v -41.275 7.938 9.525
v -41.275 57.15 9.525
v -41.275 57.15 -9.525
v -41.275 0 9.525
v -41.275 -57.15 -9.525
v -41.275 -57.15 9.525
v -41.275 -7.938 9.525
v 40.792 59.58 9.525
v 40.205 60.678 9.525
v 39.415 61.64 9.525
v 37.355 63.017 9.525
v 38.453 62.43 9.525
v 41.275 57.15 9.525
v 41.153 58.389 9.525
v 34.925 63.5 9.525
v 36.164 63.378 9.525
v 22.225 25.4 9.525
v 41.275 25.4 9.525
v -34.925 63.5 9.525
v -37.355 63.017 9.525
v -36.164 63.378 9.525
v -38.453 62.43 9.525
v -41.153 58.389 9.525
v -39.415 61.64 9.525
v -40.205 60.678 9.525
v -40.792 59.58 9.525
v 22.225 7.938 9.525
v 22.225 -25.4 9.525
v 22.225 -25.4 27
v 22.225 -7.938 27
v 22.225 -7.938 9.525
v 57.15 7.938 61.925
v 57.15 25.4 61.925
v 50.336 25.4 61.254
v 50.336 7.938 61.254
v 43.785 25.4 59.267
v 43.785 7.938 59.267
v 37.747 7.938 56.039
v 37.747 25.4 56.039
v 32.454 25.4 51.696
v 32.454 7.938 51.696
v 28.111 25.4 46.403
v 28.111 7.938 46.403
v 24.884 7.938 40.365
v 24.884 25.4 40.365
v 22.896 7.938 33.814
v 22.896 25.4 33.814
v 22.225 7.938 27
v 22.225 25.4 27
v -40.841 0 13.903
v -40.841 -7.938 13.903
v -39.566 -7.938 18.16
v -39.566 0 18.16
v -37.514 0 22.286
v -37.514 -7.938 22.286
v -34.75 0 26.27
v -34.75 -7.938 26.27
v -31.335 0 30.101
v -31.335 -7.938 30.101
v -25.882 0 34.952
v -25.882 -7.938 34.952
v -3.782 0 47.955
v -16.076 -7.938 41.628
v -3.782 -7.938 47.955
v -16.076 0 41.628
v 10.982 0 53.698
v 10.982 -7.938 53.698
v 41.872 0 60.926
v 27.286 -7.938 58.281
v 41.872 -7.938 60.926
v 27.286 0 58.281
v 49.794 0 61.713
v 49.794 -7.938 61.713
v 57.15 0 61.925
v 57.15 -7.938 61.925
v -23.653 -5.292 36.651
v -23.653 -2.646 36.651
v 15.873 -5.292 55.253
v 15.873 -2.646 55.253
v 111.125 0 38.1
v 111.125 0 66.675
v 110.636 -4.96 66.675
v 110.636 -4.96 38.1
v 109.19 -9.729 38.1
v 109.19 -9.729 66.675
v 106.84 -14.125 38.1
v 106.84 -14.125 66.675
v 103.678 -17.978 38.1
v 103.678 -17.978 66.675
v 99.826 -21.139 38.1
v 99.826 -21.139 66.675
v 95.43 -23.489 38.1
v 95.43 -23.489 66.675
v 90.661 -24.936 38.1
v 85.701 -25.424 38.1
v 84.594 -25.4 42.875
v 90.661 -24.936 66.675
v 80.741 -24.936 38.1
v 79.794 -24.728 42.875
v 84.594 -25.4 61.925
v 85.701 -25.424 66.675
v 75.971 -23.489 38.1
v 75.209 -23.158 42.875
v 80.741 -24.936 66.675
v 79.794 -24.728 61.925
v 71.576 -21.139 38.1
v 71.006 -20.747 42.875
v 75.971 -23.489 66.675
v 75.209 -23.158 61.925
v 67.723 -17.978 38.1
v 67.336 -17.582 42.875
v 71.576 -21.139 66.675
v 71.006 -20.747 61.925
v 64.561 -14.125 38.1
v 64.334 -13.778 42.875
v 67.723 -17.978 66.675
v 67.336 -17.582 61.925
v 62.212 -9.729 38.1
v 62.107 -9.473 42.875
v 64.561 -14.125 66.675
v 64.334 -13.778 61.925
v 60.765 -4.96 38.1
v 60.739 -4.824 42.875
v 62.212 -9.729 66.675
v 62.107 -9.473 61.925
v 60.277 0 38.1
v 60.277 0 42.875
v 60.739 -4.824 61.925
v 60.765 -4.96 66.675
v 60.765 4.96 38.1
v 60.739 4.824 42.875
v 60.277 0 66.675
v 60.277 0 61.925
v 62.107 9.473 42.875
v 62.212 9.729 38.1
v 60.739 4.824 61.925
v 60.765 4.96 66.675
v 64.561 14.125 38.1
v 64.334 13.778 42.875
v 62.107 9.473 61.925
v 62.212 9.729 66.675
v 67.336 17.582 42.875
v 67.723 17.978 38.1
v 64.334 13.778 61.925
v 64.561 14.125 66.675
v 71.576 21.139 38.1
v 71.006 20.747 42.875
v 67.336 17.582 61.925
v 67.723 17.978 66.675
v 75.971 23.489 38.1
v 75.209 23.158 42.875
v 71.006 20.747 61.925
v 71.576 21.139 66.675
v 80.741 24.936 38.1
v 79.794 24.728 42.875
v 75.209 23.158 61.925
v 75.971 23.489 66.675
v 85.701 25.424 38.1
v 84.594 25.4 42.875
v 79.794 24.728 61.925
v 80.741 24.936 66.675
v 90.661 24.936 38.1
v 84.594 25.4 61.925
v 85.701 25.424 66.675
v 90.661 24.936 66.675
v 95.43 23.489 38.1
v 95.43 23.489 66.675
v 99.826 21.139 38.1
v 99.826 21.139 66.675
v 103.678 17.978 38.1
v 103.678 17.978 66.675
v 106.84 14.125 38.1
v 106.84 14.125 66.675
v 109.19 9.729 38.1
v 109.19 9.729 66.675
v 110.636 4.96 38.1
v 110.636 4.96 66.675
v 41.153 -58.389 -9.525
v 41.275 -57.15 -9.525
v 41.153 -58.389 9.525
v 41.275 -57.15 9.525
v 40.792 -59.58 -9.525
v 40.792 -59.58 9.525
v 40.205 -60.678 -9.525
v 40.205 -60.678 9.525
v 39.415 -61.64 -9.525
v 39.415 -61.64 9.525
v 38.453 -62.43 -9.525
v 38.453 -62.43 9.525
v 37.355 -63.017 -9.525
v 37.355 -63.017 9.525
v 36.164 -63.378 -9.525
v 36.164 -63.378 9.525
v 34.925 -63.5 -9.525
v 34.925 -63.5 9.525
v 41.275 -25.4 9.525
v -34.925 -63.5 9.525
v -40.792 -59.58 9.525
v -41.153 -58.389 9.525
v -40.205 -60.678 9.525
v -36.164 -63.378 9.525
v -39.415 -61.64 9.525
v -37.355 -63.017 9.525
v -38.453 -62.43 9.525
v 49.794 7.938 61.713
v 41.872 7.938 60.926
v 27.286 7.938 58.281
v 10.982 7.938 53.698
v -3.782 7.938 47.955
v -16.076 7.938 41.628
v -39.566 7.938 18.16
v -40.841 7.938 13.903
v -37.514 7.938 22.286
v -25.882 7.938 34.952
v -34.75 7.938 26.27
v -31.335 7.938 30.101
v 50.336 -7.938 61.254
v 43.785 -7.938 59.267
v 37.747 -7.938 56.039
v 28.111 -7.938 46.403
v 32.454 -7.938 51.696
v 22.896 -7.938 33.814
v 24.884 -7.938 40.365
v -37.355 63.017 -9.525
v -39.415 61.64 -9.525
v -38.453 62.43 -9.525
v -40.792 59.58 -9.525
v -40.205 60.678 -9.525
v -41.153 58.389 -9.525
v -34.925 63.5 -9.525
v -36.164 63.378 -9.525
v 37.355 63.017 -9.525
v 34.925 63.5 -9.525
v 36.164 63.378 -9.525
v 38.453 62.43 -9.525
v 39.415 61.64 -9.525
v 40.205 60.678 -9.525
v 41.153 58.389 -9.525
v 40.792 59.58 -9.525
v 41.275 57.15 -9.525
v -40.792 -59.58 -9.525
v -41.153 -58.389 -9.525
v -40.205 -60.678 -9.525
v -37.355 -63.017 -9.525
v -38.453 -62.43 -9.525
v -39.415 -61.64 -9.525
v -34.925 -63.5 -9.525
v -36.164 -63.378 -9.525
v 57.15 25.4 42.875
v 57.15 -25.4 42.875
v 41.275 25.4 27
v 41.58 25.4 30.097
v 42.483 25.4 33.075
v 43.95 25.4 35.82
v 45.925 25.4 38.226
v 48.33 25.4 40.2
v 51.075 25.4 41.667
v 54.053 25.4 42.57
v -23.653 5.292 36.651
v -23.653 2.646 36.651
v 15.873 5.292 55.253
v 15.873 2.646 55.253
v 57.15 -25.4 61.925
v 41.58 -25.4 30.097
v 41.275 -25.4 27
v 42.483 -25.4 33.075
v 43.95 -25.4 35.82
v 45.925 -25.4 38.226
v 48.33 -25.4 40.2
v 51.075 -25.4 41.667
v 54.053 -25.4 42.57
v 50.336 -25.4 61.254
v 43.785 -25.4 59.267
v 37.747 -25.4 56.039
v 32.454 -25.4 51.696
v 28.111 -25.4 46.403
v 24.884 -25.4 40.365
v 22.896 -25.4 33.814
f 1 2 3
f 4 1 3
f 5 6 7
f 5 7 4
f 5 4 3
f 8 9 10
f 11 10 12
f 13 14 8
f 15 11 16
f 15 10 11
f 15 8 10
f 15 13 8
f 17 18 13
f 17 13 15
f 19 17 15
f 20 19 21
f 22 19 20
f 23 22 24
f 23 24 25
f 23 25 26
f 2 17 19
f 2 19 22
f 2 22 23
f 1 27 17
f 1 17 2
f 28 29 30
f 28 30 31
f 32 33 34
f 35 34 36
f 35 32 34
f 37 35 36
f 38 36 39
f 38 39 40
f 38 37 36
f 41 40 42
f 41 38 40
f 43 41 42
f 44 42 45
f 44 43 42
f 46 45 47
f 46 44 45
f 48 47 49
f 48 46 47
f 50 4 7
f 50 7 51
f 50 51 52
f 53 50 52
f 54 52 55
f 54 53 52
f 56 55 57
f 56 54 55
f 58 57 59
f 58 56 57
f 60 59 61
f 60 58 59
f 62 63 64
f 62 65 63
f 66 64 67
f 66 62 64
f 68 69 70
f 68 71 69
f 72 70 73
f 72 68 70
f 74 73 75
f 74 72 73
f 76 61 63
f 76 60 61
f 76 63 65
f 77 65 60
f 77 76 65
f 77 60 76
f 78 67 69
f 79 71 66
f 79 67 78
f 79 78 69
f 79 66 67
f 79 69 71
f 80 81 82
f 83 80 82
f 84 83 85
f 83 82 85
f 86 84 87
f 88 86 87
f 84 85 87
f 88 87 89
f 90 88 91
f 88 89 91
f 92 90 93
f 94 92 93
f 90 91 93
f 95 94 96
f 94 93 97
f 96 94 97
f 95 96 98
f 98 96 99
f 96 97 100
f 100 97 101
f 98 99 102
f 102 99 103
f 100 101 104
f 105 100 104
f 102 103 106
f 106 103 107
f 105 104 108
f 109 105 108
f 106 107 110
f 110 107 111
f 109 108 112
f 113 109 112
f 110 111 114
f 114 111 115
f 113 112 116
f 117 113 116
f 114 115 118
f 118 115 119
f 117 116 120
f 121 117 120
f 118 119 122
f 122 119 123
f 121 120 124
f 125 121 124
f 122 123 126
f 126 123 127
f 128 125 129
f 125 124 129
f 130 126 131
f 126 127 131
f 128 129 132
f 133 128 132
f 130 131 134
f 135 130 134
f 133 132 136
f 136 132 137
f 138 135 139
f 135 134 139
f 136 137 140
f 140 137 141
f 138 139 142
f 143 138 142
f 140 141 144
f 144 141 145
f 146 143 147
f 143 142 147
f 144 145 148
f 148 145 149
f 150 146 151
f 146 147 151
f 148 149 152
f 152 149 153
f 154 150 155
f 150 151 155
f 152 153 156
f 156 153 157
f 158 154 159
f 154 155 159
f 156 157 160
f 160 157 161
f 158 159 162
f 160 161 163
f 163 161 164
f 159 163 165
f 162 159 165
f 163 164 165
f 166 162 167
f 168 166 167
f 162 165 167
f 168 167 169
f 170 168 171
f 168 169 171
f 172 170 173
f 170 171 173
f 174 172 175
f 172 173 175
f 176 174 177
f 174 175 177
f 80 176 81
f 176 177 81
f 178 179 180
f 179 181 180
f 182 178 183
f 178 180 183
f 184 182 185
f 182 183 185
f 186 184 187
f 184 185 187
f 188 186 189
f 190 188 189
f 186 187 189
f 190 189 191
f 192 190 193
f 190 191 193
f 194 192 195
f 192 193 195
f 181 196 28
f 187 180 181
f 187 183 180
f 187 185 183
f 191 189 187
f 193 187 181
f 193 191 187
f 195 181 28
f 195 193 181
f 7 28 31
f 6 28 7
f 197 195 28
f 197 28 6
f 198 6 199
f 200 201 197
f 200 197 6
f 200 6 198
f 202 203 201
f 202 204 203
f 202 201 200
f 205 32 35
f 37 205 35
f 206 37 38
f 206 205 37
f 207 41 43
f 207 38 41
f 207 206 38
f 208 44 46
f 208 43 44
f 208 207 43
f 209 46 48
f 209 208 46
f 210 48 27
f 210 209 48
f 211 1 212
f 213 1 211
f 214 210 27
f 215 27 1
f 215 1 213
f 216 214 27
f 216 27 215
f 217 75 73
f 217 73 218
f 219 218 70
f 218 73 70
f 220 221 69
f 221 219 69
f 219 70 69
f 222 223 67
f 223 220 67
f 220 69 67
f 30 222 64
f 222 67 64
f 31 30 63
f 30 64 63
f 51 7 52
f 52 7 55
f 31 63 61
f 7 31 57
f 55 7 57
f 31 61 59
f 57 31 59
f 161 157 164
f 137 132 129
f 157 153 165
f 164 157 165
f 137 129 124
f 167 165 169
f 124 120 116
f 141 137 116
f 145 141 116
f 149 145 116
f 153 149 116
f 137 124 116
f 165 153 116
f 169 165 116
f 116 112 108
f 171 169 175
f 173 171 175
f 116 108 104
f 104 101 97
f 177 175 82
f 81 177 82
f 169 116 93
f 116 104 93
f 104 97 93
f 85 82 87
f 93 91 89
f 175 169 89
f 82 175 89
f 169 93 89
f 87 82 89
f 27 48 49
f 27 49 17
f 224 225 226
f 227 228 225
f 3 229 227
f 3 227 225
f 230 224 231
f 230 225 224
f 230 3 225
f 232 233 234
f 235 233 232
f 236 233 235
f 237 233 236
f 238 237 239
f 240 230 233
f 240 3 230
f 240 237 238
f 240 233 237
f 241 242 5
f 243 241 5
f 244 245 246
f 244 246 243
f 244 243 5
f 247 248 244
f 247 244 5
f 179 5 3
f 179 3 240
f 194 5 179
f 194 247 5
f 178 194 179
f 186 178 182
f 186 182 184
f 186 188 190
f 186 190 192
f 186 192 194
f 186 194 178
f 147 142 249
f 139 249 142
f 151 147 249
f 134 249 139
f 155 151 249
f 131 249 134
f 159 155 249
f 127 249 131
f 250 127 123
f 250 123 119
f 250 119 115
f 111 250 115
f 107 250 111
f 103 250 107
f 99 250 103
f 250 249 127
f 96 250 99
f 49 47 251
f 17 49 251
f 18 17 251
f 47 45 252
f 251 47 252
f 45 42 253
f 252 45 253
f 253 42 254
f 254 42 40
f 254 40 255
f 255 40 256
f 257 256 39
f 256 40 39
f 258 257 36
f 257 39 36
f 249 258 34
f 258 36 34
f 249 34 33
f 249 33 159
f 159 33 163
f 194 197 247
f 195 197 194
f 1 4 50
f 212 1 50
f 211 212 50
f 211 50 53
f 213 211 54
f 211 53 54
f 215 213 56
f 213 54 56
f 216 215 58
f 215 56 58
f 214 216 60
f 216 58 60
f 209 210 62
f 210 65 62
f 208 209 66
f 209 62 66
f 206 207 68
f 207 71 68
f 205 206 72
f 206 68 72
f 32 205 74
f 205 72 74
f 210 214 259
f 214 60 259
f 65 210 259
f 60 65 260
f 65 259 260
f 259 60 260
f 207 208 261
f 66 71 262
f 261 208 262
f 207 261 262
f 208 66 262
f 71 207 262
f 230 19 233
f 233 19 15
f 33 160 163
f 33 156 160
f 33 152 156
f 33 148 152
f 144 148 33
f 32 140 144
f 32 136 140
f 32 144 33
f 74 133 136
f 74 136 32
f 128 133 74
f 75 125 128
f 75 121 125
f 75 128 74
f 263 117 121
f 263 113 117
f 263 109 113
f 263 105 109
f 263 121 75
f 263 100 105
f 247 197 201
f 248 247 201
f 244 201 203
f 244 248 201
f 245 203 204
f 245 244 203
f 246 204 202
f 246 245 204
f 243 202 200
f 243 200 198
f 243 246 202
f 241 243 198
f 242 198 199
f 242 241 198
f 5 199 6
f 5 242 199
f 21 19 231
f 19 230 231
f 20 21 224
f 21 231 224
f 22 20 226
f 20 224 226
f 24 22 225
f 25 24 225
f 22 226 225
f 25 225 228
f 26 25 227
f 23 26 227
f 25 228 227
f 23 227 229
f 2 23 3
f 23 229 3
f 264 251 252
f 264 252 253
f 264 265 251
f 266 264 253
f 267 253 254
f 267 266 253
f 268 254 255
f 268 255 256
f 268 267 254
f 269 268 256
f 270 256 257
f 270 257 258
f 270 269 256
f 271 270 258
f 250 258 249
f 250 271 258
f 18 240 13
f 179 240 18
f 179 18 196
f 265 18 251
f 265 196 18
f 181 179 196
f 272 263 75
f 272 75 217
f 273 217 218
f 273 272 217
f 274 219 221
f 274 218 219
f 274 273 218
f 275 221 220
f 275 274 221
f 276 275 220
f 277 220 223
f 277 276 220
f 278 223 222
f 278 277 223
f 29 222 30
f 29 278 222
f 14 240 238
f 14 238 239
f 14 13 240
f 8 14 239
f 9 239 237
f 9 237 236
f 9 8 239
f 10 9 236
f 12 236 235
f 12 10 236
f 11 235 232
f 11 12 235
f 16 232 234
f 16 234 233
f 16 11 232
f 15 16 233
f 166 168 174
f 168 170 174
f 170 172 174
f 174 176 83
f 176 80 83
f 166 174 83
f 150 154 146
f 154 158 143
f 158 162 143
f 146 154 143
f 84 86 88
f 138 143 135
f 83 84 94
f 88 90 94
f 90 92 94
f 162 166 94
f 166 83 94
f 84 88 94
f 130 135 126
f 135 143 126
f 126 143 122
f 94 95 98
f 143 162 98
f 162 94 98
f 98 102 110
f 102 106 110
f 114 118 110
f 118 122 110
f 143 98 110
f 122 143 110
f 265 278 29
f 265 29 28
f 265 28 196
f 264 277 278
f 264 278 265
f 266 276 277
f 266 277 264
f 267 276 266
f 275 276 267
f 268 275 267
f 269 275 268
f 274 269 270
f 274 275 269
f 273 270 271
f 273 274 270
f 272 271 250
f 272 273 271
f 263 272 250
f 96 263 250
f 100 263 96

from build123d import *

# Parameters (mm, degrees)
F1_DEPTH = 63.5
F2_DEPTH = 7.9375
F0_W     = 25.3758770108
F0_H     = 19.05
F3_DEPTH = 25.4
F5_R     = 6.35


with BuildPart() as f1:
    # F0 (on Front) → F1 (new body, symmetric)
    with BuildSketch(Plane.XZ):
        Polygon((-41.275, 9.525), (-41.275, -9.525), (41.275, -9.525), (41.275, 9.525), (22.225, 9.525), align=None)
    extrude(amount=F1_DEPTH, both=True)

    # F0 (on Front) → F2 (join, symmetric)
    with BuildSketch(Plane.XZ):
        with BuildLine():
            add(Edge.make_bspline(
                [(-41.275, 9.525), (-41.3212813437, 39.7789143026), (21.7138361186, 62.3522996902), (57.15, 61.9252)],
                knots=[0, 0, 0, 0, 111.5045361635, 111.5045361635, 111.5045361635, 111.5045361635], degree=3))
            Line((-41.275, 9.525), (22.225, 9.525))
            Line((22.225, 9.525), (22.225, 27.0002))
            ThreePointArc((22.225, 27.0002), (32.4542956671, 51.6959043329), (57.15, 61.9252))
        make_face()
    extrude(amount=F2_DEPTH, both=True)

    # F0 (on Front) → F3 (join, symmetric)
    with BuildSketch(Plane.XZ):
        with Locations((73.0129385054, 52.4002)):
            Rectangle(F0_W, F0_H)
        with BuildLine():
            Line((22.225, 9.525), (41.275, 9.525))
            Line((41.275, 9.525), (41.275, 27.0002))
            ThreePointArc((41.275, 27.0002), (45.9246798487, 38.2255201513), (57.15, 42.8752))
            Line((57.15, 42.8752), (60.325, 42.8752))
            Line((60.325, 42.8752), (60.325, 61.9252))
            Line((60.325, 61.9252), (57.15, 61.9252))
            ThreePointArc((57.15, 61.9252), (32.4542956671, 51.6959043329), (22.225, 27.0002))
            Line((22.225, 27.0002), (22.225, 9.525))
        make_face()
    extrude(amount=F3_DEPTH, both=True)

    # F0 (on Front) → F4 (revolve)
    with BuildSketch(Plane.XZ):
        Polygon((85.7008770108, 66.675), (85.7008770108, 61.9252), (85.7008770108, 42.8752), (85.7008770108, 38.1), (111.125, 38.1), (111.125, 66.675), align=None)
    revolve(axis=Axis((85.7008770108, 0, 52.3875), (0, 0, -1)))

    # F5
    f5_edges = [f1.edges().sort_by_distance(p)[0] for p in [
        (41.275, -63.5, 0),
        (-41.275, -63.5, 0),
        (41.275, 63.5, 0),
        (-41.275, 63.5, 0),
    ]]
    fillet(f5_edges, radius=F5_R)


solid = f1.part
